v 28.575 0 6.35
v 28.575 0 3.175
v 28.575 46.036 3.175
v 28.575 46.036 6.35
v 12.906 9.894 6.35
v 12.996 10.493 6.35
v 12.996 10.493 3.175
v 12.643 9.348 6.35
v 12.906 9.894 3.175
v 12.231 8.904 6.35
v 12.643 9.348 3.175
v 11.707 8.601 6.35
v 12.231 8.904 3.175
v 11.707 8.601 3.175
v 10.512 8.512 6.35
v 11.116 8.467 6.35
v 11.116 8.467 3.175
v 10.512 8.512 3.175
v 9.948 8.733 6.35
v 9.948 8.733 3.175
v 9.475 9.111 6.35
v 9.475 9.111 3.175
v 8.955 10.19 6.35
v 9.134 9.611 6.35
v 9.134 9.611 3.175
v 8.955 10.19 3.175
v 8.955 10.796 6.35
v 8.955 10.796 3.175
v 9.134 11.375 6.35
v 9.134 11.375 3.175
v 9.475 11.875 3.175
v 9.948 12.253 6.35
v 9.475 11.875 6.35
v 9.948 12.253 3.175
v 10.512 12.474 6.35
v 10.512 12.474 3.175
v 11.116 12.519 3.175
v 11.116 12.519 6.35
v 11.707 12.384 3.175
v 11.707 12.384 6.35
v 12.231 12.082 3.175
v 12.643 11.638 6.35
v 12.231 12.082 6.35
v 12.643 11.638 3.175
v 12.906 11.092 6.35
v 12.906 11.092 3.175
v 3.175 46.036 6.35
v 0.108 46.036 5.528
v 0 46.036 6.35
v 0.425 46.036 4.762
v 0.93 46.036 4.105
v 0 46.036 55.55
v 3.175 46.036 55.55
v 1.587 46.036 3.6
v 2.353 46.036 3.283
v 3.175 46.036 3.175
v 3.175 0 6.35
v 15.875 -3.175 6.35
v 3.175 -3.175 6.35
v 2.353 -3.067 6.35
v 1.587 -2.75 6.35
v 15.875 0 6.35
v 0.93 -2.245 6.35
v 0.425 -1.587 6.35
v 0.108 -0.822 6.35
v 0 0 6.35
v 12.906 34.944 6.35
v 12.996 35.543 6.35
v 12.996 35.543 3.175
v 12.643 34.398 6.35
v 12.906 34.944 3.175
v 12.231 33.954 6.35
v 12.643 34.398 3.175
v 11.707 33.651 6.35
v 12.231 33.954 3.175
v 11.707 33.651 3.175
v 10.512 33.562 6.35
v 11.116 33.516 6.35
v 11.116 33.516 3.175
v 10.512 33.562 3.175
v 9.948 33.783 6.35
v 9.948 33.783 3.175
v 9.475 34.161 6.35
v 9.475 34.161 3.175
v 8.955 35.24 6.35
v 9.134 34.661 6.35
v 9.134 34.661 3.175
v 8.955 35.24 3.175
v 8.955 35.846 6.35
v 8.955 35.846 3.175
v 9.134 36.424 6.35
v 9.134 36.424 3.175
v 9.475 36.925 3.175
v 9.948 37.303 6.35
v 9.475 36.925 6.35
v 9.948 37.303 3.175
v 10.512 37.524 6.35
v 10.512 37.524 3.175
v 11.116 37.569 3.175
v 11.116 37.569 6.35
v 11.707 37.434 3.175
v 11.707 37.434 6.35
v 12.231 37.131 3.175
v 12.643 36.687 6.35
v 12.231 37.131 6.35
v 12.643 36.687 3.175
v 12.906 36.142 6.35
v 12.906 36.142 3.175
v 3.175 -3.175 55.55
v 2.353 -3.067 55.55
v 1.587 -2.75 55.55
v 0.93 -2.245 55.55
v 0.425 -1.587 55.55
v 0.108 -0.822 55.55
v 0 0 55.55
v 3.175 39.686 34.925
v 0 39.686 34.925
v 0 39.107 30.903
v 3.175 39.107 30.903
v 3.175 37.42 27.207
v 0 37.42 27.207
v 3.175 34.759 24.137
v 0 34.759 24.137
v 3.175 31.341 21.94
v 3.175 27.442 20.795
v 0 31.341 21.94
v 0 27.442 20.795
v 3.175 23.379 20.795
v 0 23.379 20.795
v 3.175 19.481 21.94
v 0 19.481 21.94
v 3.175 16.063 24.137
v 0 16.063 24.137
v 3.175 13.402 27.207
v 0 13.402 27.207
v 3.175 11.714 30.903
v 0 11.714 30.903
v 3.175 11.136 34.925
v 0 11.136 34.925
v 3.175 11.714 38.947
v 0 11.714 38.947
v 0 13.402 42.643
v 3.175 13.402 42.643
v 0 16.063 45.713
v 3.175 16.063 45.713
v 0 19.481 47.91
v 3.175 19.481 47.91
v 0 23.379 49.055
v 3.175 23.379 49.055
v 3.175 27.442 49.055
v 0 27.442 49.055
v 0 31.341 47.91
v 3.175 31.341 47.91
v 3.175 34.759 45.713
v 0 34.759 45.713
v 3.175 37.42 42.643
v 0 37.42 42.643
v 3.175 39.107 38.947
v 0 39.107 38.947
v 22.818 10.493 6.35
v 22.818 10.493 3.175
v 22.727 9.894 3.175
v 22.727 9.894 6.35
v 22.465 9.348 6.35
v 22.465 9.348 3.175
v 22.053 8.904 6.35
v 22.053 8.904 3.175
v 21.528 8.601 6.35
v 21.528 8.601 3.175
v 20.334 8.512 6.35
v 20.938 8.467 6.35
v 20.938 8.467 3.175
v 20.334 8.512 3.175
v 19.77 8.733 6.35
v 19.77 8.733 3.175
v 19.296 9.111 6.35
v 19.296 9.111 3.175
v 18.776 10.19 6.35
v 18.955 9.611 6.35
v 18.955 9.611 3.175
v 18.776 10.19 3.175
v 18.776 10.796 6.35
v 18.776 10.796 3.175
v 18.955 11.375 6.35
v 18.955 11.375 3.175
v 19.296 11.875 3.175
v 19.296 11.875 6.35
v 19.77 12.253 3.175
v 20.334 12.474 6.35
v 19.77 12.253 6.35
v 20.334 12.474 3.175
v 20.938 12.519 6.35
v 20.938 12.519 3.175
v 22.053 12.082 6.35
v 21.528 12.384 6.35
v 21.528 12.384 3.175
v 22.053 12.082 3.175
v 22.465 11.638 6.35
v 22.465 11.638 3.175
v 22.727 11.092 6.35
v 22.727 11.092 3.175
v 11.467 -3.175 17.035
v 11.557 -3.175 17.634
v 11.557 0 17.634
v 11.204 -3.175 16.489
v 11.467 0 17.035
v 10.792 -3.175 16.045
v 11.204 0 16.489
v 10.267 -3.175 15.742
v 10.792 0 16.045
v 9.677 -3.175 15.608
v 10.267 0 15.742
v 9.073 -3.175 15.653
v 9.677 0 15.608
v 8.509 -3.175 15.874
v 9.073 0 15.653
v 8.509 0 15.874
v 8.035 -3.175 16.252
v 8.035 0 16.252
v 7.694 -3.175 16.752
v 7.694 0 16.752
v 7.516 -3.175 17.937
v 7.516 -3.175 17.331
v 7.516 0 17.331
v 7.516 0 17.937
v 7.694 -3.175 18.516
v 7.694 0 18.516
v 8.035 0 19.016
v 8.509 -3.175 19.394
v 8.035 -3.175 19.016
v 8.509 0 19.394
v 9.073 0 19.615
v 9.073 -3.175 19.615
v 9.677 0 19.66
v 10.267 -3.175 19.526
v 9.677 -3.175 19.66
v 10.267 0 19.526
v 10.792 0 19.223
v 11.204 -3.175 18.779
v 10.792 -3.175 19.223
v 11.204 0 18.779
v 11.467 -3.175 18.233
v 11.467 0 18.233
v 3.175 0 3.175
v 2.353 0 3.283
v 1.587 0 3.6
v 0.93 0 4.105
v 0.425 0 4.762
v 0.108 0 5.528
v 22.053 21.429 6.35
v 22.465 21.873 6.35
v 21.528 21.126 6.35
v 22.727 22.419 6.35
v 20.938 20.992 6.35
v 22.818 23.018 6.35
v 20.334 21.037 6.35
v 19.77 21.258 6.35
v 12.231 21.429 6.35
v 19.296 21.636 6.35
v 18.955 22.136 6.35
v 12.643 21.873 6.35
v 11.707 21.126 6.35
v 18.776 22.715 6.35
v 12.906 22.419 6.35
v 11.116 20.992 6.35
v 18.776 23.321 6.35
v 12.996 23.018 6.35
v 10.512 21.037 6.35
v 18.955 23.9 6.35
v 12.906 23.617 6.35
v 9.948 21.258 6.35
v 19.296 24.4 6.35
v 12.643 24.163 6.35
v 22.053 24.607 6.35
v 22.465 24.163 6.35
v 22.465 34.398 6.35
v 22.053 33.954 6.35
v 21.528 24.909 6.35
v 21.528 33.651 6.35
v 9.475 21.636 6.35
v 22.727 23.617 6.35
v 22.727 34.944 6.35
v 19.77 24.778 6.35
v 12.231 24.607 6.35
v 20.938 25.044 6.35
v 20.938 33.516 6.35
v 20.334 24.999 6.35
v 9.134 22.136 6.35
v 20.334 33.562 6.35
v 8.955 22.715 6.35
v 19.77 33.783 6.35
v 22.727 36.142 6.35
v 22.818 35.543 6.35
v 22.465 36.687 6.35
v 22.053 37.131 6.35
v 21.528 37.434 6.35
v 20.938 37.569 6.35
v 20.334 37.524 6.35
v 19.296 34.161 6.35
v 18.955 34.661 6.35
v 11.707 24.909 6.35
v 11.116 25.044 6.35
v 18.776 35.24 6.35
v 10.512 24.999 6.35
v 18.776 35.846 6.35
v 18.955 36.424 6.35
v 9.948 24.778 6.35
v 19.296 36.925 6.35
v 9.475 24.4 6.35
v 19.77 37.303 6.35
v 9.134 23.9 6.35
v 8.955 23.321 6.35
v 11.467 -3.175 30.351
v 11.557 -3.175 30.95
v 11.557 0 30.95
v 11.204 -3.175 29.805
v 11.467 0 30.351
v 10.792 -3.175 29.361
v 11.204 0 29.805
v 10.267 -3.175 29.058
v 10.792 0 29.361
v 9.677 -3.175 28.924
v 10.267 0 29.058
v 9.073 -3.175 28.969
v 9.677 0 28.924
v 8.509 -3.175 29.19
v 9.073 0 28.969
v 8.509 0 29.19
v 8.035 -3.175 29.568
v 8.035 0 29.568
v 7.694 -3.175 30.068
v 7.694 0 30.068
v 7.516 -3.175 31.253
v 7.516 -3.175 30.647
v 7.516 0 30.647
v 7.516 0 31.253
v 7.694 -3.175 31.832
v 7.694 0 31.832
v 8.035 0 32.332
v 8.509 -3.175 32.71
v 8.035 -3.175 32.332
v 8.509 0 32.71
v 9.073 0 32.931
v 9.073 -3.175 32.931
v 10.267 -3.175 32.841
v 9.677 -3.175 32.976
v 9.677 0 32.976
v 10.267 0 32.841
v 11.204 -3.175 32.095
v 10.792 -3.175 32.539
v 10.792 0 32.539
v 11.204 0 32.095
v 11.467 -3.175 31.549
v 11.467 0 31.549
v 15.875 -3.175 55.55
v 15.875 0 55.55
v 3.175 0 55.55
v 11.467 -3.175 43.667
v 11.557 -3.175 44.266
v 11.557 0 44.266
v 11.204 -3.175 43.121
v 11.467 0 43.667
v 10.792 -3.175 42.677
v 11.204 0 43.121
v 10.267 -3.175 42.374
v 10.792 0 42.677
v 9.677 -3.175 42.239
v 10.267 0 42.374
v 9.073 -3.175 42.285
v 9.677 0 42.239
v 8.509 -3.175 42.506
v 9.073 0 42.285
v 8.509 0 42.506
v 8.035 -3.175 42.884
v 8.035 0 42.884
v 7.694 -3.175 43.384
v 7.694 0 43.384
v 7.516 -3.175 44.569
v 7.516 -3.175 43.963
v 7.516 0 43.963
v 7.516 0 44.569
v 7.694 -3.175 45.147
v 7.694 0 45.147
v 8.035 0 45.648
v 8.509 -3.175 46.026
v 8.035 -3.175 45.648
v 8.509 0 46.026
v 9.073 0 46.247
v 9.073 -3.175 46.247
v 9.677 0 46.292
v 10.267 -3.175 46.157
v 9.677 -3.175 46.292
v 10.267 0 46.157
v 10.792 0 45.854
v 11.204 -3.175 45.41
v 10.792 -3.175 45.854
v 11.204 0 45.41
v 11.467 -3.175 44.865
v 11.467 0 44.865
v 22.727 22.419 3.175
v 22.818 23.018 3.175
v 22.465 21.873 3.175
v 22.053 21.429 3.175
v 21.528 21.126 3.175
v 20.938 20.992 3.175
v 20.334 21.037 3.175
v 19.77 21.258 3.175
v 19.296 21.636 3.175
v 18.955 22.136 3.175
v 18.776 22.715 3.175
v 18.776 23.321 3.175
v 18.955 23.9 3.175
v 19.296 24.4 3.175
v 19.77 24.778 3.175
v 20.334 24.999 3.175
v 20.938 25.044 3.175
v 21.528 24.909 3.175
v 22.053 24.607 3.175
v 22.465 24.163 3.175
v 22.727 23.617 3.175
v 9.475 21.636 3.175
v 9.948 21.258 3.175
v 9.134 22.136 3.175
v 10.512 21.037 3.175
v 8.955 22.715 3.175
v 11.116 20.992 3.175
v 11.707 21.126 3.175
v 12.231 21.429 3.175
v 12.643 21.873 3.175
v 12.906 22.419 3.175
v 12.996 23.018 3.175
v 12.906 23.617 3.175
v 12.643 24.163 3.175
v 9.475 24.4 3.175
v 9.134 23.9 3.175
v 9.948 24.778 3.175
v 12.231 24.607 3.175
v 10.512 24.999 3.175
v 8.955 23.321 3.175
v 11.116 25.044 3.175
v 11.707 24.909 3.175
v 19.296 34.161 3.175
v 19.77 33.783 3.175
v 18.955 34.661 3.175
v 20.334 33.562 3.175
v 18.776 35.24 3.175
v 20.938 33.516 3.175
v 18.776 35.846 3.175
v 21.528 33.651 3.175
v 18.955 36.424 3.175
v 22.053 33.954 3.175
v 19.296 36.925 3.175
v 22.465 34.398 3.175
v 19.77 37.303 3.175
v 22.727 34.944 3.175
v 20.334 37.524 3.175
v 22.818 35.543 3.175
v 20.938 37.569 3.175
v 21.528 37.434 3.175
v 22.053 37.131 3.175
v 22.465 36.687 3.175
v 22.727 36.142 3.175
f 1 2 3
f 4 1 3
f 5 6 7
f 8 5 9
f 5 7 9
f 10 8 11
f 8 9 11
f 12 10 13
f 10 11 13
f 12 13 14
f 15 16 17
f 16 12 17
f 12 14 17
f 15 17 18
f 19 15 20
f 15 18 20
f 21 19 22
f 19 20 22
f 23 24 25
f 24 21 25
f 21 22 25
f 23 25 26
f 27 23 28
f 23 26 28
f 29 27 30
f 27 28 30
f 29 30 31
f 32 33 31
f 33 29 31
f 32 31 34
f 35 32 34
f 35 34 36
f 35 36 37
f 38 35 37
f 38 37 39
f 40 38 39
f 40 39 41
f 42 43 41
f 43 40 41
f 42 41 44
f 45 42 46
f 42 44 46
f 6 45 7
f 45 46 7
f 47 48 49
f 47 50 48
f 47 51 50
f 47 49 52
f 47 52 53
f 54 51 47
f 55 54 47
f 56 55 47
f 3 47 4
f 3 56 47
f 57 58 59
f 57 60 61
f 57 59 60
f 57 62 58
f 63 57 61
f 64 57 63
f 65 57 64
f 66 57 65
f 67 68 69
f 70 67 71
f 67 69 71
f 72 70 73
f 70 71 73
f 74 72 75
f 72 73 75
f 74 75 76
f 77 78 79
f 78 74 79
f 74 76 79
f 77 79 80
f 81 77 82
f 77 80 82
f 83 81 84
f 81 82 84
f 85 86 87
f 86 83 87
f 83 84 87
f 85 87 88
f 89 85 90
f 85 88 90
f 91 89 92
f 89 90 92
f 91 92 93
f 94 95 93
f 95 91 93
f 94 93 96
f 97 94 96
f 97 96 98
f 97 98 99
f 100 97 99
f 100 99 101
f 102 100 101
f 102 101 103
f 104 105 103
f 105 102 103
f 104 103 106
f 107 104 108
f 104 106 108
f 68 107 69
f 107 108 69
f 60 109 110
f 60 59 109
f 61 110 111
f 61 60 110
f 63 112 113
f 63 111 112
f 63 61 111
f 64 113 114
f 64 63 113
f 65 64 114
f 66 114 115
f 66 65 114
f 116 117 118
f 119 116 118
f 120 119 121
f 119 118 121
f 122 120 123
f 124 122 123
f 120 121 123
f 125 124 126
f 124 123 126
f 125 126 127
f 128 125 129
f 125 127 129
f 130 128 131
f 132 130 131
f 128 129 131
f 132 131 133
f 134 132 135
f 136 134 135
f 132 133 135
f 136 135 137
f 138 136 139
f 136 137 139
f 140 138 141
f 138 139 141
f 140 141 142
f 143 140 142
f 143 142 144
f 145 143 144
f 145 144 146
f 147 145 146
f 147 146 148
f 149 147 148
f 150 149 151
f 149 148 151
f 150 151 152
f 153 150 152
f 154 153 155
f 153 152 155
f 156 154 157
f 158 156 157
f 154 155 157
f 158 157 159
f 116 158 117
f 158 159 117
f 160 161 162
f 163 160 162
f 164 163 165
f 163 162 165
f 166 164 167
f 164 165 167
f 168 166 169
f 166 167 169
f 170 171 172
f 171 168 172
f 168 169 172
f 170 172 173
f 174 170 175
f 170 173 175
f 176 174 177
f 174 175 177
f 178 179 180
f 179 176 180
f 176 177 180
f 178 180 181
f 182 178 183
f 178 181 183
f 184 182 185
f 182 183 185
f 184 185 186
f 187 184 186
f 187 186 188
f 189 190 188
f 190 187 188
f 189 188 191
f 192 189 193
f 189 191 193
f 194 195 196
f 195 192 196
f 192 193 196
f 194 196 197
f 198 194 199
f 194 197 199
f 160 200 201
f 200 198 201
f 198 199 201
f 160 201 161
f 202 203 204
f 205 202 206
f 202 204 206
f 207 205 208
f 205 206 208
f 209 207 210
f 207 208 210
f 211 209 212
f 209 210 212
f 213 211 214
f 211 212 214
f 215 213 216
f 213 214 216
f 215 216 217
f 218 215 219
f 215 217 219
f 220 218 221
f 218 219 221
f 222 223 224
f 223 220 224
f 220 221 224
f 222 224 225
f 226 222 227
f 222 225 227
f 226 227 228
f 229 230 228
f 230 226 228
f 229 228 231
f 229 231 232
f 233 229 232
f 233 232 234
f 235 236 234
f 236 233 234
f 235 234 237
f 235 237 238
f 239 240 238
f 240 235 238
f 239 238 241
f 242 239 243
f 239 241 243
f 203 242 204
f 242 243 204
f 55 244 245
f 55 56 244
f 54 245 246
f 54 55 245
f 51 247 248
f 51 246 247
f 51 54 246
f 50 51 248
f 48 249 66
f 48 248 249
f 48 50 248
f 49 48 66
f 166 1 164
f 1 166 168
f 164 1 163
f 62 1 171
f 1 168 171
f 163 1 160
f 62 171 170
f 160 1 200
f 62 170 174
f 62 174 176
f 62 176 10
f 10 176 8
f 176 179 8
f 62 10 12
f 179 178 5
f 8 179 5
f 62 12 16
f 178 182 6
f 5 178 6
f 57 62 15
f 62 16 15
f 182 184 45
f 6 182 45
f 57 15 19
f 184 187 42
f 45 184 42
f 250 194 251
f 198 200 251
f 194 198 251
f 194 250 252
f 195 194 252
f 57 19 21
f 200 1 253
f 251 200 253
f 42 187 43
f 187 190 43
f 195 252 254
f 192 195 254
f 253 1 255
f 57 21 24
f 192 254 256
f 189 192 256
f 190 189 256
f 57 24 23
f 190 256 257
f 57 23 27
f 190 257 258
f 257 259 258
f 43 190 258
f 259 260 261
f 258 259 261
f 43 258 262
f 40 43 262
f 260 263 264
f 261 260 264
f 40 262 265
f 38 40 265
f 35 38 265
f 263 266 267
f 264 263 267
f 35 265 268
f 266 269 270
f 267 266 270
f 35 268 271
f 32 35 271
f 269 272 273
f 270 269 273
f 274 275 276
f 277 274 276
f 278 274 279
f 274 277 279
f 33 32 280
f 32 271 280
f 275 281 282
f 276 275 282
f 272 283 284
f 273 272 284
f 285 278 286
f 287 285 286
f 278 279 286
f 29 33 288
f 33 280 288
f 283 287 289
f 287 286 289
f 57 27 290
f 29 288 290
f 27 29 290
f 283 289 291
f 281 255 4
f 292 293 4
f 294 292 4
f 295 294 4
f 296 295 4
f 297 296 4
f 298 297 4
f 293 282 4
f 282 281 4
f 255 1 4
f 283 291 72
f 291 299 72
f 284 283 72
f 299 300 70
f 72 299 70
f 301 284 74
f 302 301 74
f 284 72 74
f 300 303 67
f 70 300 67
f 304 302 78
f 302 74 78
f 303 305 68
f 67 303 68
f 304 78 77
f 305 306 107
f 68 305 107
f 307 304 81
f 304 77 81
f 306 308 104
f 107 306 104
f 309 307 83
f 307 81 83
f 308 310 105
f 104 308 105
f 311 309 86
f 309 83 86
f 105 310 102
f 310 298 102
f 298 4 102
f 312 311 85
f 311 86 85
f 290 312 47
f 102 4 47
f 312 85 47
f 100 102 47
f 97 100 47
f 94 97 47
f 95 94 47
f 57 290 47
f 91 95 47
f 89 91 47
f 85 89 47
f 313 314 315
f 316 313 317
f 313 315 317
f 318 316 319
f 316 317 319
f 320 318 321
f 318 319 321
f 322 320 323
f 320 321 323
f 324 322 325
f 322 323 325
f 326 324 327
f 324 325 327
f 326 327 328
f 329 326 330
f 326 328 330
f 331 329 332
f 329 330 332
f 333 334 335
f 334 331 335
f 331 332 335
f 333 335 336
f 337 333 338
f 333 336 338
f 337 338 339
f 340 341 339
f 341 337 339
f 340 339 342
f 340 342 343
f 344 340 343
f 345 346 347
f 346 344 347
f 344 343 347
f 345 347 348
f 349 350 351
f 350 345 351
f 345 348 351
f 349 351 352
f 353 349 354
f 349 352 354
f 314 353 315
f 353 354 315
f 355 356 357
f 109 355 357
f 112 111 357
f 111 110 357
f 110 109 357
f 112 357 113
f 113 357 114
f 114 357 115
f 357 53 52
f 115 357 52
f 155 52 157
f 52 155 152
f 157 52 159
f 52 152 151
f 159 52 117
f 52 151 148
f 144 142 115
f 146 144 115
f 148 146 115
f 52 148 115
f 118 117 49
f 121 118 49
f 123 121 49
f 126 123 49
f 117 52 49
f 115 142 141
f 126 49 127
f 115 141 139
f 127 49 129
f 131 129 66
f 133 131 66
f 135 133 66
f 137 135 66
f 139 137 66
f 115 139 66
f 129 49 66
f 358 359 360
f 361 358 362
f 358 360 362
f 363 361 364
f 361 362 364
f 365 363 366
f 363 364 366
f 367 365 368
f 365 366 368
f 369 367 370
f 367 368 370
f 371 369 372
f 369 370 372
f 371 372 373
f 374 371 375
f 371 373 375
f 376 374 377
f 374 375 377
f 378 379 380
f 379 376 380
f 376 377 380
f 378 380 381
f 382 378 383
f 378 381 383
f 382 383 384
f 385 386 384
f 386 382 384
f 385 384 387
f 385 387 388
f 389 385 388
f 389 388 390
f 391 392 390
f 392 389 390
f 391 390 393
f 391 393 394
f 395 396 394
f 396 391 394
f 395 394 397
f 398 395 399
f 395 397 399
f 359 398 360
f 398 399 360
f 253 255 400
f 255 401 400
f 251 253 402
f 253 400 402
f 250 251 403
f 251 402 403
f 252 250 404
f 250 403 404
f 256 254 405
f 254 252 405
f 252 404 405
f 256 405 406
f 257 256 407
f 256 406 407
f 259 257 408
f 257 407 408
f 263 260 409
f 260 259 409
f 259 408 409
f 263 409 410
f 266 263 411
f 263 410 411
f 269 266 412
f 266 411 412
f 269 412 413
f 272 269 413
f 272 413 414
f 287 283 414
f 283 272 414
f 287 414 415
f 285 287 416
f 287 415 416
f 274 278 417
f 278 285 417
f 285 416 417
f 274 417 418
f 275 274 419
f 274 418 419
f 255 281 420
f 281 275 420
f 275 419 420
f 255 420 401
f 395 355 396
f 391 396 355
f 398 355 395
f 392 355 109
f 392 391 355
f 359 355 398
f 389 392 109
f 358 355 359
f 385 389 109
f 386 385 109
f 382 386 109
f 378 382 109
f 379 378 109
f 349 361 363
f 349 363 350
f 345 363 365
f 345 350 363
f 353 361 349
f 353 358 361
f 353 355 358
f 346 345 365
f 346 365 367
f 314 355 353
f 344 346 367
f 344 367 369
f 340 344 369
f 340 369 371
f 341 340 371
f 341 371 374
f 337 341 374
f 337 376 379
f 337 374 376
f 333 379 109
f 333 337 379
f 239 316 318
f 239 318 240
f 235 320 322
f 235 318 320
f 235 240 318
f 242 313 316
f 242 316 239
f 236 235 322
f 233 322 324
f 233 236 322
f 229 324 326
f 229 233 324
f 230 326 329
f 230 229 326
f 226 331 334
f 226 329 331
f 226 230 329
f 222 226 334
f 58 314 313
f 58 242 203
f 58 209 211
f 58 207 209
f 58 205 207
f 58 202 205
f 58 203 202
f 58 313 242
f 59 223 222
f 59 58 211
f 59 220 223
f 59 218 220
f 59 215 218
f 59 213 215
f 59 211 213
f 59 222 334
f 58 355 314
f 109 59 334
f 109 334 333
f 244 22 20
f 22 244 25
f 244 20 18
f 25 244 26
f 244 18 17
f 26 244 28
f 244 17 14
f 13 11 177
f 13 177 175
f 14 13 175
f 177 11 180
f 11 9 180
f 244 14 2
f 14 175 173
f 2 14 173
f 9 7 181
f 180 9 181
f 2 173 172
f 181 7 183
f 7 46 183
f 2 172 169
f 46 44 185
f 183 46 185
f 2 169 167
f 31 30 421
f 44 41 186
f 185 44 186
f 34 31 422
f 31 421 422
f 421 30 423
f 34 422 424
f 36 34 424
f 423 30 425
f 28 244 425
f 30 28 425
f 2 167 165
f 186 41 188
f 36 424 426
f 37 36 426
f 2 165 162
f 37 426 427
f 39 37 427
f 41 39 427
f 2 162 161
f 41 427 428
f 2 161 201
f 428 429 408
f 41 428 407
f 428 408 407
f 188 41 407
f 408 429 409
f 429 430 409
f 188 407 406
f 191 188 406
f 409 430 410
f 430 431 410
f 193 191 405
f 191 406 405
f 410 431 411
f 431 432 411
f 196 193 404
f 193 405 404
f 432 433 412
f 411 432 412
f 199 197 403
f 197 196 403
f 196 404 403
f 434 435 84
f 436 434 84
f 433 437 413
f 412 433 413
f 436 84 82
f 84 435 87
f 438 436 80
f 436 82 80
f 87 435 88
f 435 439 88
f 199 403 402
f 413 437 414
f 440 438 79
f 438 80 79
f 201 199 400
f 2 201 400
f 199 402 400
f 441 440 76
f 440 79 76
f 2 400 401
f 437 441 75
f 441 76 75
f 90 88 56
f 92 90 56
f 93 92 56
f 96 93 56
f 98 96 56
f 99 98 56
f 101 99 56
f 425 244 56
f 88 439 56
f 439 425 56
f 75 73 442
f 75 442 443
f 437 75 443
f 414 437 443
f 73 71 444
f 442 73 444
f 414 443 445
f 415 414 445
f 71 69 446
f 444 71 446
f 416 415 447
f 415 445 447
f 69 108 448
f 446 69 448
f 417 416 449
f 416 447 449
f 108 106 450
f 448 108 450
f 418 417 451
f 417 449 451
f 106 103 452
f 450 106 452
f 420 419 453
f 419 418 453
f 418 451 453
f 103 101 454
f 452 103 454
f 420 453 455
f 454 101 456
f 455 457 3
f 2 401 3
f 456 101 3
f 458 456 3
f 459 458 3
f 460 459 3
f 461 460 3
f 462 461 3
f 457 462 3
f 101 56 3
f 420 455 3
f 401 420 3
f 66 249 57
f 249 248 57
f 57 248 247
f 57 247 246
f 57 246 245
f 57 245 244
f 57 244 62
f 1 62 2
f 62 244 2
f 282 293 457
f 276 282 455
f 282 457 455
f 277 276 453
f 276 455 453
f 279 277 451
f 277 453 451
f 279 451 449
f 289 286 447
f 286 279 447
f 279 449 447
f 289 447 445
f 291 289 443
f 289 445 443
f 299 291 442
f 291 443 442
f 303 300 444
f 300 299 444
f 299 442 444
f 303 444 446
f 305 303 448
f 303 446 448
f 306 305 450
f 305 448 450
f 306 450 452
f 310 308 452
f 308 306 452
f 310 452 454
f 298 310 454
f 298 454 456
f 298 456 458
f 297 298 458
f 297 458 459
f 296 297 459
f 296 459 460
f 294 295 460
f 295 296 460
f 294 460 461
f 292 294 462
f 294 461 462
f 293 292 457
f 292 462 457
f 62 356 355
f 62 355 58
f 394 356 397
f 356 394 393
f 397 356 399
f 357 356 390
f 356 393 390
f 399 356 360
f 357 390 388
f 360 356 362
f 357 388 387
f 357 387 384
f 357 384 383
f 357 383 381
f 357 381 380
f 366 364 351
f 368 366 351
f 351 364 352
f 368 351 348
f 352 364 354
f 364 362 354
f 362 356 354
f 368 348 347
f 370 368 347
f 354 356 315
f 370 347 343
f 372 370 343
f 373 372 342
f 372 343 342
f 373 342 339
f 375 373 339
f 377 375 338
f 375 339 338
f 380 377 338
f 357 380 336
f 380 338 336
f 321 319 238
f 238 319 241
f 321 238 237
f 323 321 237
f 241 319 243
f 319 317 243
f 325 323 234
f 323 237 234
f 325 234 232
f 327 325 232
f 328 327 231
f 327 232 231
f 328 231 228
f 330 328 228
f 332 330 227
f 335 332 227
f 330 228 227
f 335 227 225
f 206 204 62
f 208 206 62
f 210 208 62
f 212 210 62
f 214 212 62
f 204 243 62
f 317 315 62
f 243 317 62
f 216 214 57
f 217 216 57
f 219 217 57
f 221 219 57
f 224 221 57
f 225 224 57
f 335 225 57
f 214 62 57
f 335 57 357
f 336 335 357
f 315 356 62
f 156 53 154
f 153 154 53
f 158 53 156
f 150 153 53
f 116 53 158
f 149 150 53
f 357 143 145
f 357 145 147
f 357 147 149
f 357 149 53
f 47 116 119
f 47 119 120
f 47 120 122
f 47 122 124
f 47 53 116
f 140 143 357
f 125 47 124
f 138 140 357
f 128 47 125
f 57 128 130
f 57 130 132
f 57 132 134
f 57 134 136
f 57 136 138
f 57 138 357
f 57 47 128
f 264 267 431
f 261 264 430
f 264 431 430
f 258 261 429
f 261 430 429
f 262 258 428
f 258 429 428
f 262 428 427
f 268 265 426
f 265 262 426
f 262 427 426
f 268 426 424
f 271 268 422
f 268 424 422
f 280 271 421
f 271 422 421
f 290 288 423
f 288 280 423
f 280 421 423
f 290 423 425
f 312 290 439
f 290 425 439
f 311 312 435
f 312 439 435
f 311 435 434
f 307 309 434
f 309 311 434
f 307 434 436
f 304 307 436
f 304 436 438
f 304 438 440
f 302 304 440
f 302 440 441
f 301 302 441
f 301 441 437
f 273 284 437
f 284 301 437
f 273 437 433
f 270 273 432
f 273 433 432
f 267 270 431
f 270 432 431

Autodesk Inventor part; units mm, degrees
ref_plane "YZ Plane" through (0, 0, 0) normal (1, 0, 0) x (0, 1, 0)
ref_plane "XZ Plane" through (0, 0, 0) normal (0, 1, 0) x (-1, 0, 0)
ref_plane "XY Plane" through (0, 0, 0) normal (0, 0, 1) x (1, 0, 0)
sketch "Sketch1" plane through (0, 0, 0) normal (1, 0, 0) x (0, 1, 0)
  line L0 (0, 0) -> (46.0357, 0)
  line L1 (46.0357, 0) -> (46.0357, -49.1998)
  line L2 (46.0357, -49.1998) -> (0, -49.1998)
  line L3 (0, -49.1998) -> (0, 0)
  circle A0 centre (25.4109, -28.575) radius 14.2748
  point P0 (39.6857, -28.575)
  point P1 (25.4109, -42.8498)
  dimension "d0" = 25.4109
  dimension "d1" = 28.5496
  dimension "d2" = 6.35
  dimension "d3" = 6.35
  dimension "d4" = 28.575
extrude "Extrusion1" add sketch "Sketch1" along normal blind 3.175
sketch "Sketch2" plane through (0, 0, -49.1998) normal (0, -1, 0) x (1, 0, 0)
  line L0 (3.175, 49.1998) -> (3.175, 0) projected
  line L1 (3.175, 49.1998) -> (15.875, 49.1998)
  line L2 (15.875, 49.1998) -> (15.875, 0)
  line L3 (15.875, 0) -> (3.175, 0)
  line L4 (3.175, 0) -> (3.175, 49.1998)
  point P0 (0, 49.1998)
  dimension "d7" = 12.7
extrude "Extrusion2" add sketch "Sketch2" along normal blind 3.175
sketch "Sketch3" plane through (0, 0, 0) normal (0, 0, 1) x (1, 0, 0)
  line L0 (3.175, 0) -> (3.175, 46.0357) projected
  line L1 (3.175, 0) -> (28.575, 0)
  line L2 (28.575, 0) -> (28.575, 49.2107)
  line L3 (28.575, 49.2107) -> (3.175, 49.2107)
  line L4 (3.175, 49.2107) -> (3.175, 0)
  point P0 (0, 0)
  dimension "d10" = 25.4
extrude "Extrusion3" add sketch "Sketch3" along normal blind 3.175
sketch "Sketch4" plane through (3.175, -3.175, 0) normal (0, 0, 1) x (1, 0, 0)
  line L0 (-3.175, 3.175) -> (0, 3.175) projected
  line L1 (0, 3.175) -> (0, 0) projected
  arc A0 (-3.175, 3.175) -> (0, 0) centre (0, 3.175) ccw
extrude "Extrusion4" add sketch "Sketch4" against normal up to surface (49.1998 mm away)
sketch "Sketch6" plane through (0, 0, 3.175) normal (0, 0, 1) x (1, 0, 0)
  line L0 (3.175, 0) -> (28.575, 0) projected
  line L1 (28.575, 0) -> (28.575, 49.2107) projected
  line L2 (28.575, 49.2107) -> (3.175, 49.2107) projected
  circle A0 centre (10.9643, 35.5428) radius 2.032
  circle A1 centre (20.7857, 35.5428) radius 2.032
  line L3 (12.9963, 35.5428) -> (18.7537, 35.5428)
  line L4 (8.9323, 35.5428) -> (3.175, 35.5428)
  line L5 (22.8177, 35.5428) -> (28.575, 35.5428)
  circle A2 centre (10.9643, 23.0179) radius 2.032
  circle A3 centre (10.9643, 10.4929) radius 2.032
  line L6 (28.575, 49.2107) -> (3.175, 49.2107) projected
  line L7 (10.9643, 25.0499) -> (10.9643, 33.5108)
  line L8 (10.9643, 12.5249) -> (10.9643, 20.9859)
  line L9 (10.9643, 8.4609) -> (10.9643, 0)
  circle A4 centre (20.7857, 23.0179) radius 2.032
  circle A5 centre (20.7857, 10.4929) radius 2.032
  line L10 (3.175, 49.2107) -> (3.175, 0) projected
  line L11 (3.175, 46.0357) -> (28.575, 46.0357)
  line L12 (10.9643, 37.5748) -> (10.9643, 46.0357)
  point P0 (0, 0)
  dimension "d17" = 4.064
  dimension "d20" = 4.064
  dimension "d23" = 4.064
  dimension "d24" = 4.064
  dimension "d25" = 4.064
  dimension "d26" = 4.064
  dimension "d34" = 3.175
extrude "Extrusion6" cut sketch "Sketch6" against normal blind 3.175 contours A3 | A0 | A1 | A2 | A4 | A5
sketch "Sketch7" plane through (0, 0, -49.1998) normal (0, 1, 0) x (1, 0, 0)
  line L0 (3.175, -49.1998) -> (15.875, -49.1998) projected
  line L1 (15.875, -49.1998) -> (15.875, 0) construction
  line L2 (15.875, 0) -> (3.175, 0) projected
  line L3 (3.175, -49.1998) -> (3.175, 0) projected
  circle A0 centre (9.525, -11.284) radius 2.032
  circle A1 centre (9.525, -24.5999) radius 2.032
  circle A2 centre (9.525, -37.9158) radius 2.032
  line L4 (9.525, -9.2519) -> (9.525, 0)
  line L5 (9.525, -13.3159) -> (9.525, -22.5679) construction
  line L6 (9.525, -26.6319) -> (9.525, -35.8838)
  line L7 (9.525, -39.9478) -> (9.525, -49.1998)
  line L8 (28.575, -49.1998) -> (3.175, -49.1998) projected
  point P0 (0, -49.1998)
  dimension "d29" = 4.064
  dimension "d30" = 4.064
  dimension "d31" = 4.064
extrude "Extrusion7" cut sketch "Sketch7" against normal blind 3.175
sketch "Sketch8" plane through (0, 0, 3.175) normal (0, 0, 1) x (1, 0, 0)
  line L0 (3.175, 49.2107) -> (3.175, 46.0357) projected
  line L1 (28.575, 49.2107) -> (3.175, 49.2107) projected
  line L2 (3.175, 46.0357) -> (28.575, 46.0357)
  line L3 (28.575, 46.0357) -> (28.575, 49.2107)
  line L4 (28.575, 49.2107) -> (3.175, 49.2107)
  line L5 (3.175, 49.2107) -> (3.175, 46.0357)
  point P0 (0, 0)
extrude "Extrusion8" cut sketch "Sketch8" against normal blind 25.4
sketch "Sketch9" plane through (0, 46.0357, 0) normal (0, 1, 0) x (1, 0, 0)
  line L0 (0, 0) -> (3.175, 0) projected
  line L1 (3.175, -3.175) -> (3.175, 0) projected
  arc A0 (0, 0) -> (3.175, -3.175) centre (3.175, 0) ccw
extrude "Extrusion9" add sketch "Sketch9" against normal up to surface (46.0357 mm away)
mirror "Mirror1" about plane through (15.875, 24.6054, 3.175) normal (0, 0, 1)
sketch "Sketch10" plane through (0, 46.0357, -49.1998) normal (0, 1, 0) x (1, 0, 0)
  line L0 (-4.9915, -52.3748) -> (39.2874, -52.3748)
  line L1 (39.2874, -52.3748) -> (39.2874, 13.8222)
  line L2 (39.2874, 13.8222) -> (-4.9915, 13.8222)
  line L3 (-4.9915, 13.8222) -> (-4.9915, -52.3748)
  point P0 (0, -49.1998)
extrude "Extrusion10" cut sketch "Sketch10" against normal blind 53.975
properties part number "Robot to Bottomish Plate to Pivot Hex Axle OTHER SIDE"
